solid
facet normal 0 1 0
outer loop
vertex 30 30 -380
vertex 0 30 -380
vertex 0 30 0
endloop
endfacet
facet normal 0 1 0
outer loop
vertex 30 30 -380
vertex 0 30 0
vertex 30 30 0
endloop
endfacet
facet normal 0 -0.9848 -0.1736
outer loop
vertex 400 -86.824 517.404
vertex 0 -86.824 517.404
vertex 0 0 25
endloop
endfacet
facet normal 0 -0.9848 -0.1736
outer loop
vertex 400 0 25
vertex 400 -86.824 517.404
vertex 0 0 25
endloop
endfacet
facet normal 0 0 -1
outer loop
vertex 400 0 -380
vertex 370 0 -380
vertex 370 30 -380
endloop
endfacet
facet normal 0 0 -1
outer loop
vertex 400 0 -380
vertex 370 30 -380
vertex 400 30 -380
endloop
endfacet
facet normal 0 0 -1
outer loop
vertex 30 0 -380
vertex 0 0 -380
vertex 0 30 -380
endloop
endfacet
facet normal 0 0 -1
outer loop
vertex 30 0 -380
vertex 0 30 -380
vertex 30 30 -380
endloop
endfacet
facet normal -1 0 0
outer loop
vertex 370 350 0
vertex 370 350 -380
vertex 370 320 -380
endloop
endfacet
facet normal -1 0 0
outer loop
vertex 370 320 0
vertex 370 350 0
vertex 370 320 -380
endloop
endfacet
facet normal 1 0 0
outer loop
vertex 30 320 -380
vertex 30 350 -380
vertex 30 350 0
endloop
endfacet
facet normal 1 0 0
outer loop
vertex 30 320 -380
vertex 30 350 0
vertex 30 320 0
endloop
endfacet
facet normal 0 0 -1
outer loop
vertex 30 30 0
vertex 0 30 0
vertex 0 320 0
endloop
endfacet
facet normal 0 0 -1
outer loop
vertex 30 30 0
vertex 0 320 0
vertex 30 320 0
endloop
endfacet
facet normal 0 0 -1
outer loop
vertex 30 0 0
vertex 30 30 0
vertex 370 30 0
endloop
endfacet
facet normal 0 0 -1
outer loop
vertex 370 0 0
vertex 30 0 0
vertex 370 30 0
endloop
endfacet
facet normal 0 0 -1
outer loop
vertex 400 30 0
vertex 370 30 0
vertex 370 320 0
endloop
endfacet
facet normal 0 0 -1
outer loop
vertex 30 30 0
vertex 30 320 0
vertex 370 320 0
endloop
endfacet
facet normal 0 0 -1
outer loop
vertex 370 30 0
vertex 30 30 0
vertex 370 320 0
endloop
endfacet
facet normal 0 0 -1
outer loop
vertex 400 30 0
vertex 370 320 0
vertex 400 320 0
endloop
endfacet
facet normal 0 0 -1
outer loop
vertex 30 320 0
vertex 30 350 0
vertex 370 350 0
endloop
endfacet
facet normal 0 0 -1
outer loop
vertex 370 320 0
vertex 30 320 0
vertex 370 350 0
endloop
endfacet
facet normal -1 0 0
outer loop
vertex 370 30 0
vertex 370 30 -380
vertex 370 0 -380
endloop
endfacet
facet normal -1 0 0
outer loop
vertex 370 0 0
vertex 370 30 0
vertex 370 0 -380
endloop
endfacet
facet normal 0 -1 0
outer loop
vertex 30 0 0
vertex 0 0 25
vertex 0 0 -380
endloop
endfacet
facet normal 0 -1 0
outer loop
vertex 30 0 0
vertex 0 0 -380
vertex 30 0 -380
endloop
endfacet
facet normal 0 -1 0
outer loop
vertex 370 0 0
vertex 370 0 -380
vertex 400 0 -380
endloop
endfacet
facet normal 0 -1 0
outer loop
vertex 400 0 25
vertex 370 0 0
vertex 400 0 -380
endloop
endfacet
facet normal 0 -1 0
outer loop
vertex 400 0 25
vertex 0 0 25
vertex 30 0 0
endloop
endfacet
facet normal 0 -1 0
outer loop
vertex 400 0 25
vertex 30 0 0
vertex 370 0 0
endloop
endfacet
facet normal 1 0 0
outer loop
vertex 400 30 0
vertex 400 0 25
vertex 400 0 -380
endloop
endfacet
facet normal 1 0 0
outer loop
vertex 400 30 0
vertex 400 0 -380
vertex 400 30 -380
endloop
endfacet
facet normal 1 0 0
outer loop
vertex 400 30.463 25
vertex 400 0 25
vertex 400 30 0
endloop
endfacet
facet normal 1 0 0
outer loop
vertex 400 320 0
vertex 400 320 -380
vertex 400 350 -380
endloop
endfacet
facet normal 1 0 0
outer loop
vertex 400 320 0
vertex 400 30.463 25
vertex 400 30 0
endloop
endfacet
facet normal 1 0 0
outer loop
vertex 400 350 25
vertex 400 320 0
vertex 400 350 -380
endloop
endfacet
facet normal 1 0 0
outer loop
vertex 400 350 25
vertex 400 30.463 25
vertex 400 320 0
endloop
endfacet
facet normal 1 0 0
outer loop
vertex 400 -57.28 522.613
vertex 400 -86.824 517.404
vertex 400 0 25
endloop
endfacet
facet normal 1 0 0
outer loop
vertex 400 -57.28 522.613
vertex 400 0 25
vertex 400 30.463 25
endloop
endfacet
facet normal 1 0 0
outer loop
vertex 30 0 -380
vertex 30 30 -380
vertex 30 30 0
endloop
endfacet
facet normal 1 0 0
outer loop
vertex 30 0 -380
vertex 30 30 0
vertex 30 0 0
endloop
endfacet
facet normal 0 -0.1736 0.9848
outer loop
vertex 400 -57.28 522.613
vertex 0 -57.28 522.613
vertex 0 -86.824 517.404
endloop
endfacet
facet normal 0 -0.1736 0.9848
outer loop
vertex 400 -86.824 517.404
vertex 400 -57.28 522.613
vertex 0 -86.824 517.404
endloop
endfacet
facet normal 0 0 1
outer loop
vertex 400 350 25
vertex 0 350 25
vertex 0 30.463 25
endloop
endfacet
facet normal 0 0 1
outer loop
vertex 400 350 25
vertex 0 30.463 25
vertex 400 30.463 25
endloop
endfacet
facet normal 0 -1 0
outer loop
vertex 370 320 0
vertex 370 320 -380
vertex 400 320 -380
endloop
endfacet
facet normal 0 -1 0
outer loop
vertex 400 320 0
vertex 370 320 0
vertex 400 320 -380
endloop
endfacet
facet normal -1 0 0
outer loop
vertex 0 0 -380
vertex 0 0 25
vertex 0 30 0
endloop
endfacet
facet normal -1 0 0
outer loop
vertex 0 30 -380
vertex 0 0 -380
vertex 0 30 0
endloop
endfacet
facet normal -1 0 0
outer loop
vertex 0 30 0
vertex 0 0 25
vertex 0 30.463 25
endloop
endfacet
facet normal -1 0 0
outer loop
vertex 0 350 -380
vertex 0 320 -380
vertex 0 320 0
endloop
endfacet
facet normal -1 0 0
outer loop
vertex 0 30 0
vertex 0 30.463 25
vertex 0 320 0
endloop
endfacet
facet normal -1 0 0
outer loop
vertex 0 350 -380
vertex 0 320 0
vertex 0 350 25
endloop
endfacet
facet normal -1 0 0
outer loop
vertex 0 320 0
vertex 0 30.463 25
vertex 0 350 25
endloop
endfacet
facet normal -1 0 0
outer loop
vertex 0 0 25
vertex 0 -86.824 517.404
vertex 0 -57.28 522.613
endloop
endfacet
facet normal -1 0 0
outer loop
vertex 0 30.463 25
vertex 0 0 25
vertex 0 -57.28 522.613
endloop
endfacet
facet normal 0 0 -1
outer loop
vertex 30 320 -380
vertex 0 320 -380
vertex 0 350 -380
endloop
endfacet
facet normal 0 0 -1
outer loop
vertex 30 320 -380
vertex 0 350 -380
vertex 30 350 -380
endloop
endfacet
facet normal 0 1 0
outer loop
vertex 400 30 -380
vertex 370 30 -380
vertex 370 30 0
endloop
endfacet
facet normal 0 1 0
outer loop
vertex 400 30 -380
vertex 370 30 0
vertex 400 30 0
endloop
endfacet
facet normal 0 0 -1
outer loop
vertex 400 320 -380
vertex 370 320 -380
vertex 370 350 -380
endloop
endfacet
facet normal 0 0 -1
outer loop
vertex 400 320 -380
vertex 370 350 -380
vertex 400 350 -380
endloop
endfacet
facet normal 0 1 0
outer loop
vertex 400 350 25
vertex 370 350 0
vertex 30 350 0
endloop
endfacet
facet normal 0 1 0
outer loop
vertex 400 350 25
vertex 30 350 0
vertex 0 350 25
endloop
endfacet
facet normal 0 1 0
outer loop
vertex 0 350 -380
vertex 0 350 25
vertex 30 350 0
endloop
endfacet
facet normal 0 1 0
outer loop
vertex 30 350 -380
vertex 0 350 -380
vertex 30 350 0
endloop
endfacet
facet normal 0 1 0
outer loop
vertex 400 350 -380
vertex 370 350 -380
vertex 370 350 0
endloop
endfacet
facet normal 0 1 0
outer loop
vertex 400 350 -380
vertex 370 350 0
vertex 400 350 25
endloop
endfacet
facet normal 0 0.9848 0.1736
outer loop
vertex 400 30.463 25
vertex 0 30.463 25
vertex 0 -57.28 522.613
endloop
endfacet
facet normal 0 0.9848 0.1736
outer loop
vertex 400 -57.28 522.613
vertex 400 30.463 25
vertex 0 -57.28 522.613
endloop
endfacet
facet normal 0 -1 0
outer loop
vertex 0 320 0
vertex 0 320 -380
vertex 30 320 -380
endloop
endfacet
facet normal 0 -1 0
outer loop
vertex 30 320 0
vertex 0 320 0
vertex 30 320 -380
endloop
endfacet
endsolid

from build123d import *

# Parameters (mm, degrees)
F0_W     = 400
F0_H     = 350
F1_DEPTH = 25
F2_W     = 30
F2_H     = 30
F3_DEPTH = 380
F5_DEPTH = 400


with BuildPart() as f1:
    # F0 (on Top) → F1 (new body)
    with BuildSketch(Plane.XY):
        with Locations((200, 175)):
            Rectangle(F0_W, F0_H)
    extrude(amount=F1_DEPTH)

    # F2 (on face) → F3 (join)
    with BuildSketch(Plane(origin=(0, 0, 0), x_dir=(1, 0, 0), z_dir=(0, 0, -1))):
        with Locations((15, -15)):
            Rectangle(F2_W, F2_H)
        with Locations((385, -15)):
            Rectangle(F2_W, F2_H)
        with Locations((15, -335)):
            Rectangle(F2_W, F2_H)
        with Locations((385, -335)):
            Rectangle(F2_W, F2_H)
    extrude(amount=F3_DEPTH)

    # F4 (on Right) → F5 (join, through all)
    with BuildSketch(Plane.YZ):
        Polygon((-86.824089, 517.403877), (0, 25), (30.462798, 25), (-57.279856, 522.613322), align=None)
    extrude(amount=F5_DEPTH)


solid = f1.part
